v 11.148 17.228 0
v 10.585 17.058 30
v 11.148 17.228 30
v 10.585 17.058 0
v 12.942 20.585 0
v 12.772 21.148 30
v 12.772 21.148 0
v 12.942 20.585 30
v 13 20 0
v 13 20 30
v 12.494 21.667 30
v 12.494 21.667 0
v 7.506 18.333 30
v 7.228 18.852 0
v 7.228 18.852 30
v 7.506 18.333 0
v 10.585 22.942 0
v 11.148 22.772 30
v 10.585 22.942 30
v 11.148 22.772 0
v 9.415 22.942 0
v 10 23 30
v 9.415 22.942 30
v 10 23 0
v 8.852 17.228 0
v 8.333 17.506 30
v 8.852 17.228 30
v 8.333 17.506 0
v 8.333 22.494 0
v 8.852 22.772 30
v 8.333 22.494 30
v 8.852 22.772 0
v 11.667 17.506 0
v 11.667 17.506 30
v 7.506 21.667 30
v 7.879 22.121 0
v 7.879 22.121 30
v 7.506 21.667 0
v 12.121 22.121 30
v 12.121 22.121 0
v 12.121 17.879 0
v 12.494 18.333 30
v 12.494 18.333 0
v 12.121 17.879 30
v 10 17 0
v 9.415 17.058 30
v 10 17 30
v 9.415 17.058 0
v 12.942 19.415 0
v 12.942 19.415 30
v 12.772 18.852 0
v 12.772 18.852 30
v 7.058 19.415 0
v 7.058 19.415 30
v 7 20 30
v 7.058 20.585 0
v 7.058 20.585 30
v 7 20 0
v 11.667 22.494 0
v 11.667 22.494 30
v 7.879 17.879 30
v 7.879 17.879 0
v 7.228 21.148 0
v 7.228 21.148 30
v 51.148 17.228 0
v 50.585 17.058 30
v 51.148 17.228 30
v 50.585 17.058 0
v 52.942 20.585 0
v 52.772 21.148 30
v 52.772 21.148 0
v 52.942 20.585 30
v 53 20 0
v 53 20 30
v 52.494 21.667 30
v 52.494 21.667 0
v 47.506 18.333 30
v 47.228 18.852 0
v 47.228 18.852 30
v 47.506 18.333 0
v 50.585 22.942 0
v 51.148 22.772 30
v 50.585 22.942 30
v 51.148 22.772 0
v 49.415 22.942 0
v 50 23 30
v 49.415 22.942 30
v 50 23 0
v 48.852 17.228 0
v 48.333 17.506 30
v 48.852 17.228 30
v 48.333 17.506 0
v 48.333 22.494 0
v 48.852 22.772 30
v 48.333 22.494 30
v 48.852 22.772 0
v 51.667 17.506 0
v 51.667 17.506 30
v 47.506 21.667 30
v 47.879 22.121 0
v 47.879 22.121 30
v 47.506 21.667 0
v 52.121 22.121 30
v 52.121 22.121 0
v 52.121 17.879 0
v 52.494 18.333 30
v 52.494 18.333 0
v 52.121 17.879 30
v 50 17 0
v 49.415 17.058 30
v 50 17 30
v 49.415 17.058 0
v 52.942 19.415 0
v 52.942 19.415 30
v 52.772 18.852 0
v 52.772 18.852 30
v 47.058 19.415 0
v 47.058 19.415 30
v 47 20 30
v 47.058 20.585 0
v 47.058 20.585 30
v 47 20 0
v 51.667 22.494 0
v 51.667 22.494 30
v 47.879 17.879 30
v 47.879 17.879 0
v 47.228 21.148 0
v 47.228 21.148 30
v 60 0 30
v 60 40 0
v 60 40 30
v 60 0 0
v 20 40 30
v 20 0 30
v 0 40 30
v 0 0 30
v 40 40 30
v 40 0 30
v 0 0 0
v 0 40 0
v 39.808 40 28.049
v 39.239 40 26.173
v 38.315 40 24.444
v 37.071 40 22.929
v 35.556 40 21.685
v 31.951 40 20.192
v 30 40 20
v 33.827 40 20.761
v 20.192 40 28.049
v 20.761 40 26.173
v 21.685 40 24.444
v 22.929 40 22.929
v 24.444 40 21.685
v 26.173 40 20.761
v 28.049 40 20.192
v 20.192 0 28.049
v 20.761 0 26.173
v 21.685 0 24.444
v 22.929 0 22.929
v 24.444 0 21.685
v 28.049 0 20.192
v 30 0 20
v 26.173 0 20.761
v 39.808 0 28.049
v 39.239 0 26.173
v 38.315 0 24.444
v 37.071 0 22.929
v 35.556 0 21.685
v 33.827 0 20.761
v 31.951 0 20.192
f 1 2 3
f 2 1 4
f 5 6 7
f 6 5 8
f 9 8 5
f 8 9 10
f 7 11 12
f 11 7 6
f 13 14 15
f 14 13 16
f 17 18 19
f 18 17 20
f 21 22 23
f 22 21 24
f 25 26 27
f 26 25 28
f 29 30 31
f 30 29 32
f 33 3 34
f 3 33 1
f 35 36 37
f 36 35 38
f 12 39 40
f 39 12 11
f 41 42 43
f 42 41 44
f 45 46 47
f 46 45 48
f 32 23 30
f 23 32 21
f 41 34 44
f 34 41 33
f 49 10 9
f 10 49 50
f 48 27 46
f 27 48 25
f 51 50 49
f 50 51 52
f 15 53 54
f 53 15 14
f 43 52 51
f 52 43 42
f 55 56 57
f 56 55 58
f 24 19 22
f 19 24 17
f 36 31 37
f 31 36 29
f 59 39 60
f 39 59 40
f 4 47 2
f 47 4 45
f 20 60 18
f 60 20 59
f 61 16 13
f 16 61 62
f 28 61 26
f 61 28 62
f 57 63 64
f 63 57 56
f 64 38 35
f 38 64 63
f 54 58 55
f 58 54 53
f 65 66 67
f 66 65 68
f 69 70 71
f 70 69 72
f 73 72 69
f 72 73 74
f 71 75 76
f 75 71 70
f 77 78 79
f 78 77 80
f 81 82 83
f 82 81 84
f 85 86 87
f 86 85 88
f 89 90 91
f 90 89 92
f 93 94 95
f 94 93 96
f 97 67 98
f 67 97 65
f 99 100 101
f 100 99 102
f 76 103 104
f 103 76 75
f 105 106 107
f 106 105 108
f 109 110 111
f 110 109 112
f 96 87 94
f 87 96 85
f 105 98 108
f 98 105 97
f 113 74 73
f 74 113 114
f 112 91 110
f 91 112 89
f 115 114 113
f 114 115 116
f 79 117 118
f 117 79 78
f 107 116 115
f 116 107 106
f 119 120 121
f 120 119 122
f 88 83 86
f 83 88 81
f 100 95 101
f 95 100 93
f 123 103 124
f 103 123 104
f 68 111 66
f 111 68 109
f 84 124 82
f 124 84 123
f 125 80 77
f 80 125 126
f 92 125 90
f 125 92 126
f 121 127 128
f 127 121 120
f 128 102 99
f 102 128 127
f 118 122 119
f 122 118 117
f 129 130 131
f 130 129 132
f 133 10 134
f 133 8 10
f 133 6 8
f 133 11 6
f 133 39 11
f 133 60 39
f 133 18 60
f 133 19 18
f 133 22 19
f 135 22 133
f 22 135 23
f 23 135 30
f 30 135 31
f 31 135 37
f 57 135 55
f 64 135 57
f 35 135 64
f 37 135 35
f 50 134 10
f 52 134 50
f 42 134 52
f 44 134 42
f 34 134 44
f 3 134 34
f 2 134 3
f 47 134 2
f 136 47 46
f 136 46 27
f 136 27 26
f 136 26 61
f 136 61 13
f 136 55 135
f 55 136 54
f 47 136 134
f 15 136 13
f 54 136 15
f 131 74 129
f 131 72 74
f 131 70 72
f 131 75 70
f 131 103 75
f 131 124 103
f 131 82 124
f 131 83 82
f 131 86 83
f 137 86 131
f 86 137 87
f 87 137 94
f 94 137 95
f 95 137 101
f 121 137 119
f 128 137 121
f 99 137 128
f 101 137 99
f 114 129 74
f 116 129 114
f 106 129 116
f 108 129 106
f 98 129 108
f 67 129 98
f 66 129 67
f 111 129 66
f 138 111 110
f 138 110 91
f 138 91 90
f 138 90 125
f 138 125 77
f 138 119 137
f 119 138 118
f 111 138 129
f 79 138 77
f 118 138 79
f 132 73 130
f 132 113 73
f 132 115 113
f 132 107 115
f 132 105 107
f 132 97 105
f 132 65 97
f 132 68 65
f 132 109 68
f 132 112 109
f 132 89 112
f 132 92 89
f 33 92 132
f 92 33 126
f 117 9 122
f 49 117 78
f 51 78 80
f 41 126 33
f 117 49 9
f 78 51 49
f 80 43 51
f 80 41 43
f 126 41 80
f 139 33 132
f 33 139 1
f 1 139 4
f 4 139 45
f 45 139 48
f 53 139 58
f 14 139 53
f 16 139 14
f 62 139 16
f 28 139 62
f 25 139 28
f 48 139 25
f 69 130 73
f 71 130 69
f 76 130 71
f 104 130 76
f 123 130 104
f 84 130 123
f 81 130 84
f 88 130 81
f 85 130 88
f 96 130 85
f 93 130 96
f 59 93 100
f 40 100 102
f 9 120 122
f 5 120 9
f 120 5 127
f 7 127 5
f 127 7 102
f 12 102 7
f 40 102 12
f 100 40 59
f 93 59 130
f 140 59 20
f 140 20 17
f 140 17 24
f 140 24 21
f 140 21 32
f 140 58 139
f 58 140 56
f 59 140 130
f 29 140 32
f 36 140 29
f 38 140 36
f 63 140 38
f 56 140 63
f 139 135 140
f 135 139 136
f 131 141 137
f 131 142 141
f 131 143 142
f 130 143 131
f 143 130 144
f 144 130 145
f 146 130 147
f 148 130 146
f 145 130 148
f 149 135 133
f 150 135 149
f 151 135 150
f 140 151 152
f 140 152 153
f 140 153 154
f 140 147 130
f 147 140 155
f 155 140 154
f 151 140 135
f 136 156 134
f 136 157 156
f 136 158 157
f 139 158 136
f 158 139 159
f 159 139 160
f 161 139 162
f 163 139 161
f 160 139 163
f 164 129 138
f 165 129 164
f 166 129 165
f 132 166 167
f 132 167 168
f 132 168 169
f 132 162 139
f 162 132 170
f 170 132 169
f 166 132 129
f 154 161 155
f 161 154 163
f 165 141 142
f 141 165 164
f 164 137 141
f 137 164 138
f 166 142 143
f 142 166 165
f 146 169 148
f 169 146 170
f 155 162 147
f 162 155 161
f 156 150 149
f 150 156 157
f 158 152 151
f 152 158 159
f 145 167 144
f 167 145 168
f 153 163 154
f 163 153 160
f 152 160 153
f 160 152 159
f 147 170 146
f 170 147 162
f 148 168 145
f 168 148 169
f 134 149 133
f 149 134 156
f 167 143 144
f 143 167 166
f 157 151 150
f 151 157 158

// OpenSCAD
$fn = 32;

// ----------------------------------------------------------------------
// Saddle clamp: plain shaft clamp
// ----------------------------------------------------------------------

// --- parameters (mm) ---
blk_l = 60;               // block length, X
blk_w = 40;               // block width, Y
blk_h = 30;               // block height
clamp_r = 10;             // shaft groove radius
hole_r = 3;               // bolt hole radius
hole_m = 10;              // bolt hole margin from the ends
fit_tol = 0.05;           // tolerance for press fits, mm
free_tol = 0.3;           // tolerance for clearance fits, mm

saw_depth = clamp_r + 3;  // saw kerf depth

difference() {
  cube([blk_l, blk_w, blk_h]);
  translate([blk_l / 2, -1, blk_h])
    rotate([-90, 0, 0])
      cylinder(h = blk_w + 2, r = clamp_r);
  for (sx = [0, 1])
    translate([sx ? blk_l - hole_m : hole_m, blk_w / 2, -1])
      cylinder(r = hole_r, h = blk_h + 2);
}
